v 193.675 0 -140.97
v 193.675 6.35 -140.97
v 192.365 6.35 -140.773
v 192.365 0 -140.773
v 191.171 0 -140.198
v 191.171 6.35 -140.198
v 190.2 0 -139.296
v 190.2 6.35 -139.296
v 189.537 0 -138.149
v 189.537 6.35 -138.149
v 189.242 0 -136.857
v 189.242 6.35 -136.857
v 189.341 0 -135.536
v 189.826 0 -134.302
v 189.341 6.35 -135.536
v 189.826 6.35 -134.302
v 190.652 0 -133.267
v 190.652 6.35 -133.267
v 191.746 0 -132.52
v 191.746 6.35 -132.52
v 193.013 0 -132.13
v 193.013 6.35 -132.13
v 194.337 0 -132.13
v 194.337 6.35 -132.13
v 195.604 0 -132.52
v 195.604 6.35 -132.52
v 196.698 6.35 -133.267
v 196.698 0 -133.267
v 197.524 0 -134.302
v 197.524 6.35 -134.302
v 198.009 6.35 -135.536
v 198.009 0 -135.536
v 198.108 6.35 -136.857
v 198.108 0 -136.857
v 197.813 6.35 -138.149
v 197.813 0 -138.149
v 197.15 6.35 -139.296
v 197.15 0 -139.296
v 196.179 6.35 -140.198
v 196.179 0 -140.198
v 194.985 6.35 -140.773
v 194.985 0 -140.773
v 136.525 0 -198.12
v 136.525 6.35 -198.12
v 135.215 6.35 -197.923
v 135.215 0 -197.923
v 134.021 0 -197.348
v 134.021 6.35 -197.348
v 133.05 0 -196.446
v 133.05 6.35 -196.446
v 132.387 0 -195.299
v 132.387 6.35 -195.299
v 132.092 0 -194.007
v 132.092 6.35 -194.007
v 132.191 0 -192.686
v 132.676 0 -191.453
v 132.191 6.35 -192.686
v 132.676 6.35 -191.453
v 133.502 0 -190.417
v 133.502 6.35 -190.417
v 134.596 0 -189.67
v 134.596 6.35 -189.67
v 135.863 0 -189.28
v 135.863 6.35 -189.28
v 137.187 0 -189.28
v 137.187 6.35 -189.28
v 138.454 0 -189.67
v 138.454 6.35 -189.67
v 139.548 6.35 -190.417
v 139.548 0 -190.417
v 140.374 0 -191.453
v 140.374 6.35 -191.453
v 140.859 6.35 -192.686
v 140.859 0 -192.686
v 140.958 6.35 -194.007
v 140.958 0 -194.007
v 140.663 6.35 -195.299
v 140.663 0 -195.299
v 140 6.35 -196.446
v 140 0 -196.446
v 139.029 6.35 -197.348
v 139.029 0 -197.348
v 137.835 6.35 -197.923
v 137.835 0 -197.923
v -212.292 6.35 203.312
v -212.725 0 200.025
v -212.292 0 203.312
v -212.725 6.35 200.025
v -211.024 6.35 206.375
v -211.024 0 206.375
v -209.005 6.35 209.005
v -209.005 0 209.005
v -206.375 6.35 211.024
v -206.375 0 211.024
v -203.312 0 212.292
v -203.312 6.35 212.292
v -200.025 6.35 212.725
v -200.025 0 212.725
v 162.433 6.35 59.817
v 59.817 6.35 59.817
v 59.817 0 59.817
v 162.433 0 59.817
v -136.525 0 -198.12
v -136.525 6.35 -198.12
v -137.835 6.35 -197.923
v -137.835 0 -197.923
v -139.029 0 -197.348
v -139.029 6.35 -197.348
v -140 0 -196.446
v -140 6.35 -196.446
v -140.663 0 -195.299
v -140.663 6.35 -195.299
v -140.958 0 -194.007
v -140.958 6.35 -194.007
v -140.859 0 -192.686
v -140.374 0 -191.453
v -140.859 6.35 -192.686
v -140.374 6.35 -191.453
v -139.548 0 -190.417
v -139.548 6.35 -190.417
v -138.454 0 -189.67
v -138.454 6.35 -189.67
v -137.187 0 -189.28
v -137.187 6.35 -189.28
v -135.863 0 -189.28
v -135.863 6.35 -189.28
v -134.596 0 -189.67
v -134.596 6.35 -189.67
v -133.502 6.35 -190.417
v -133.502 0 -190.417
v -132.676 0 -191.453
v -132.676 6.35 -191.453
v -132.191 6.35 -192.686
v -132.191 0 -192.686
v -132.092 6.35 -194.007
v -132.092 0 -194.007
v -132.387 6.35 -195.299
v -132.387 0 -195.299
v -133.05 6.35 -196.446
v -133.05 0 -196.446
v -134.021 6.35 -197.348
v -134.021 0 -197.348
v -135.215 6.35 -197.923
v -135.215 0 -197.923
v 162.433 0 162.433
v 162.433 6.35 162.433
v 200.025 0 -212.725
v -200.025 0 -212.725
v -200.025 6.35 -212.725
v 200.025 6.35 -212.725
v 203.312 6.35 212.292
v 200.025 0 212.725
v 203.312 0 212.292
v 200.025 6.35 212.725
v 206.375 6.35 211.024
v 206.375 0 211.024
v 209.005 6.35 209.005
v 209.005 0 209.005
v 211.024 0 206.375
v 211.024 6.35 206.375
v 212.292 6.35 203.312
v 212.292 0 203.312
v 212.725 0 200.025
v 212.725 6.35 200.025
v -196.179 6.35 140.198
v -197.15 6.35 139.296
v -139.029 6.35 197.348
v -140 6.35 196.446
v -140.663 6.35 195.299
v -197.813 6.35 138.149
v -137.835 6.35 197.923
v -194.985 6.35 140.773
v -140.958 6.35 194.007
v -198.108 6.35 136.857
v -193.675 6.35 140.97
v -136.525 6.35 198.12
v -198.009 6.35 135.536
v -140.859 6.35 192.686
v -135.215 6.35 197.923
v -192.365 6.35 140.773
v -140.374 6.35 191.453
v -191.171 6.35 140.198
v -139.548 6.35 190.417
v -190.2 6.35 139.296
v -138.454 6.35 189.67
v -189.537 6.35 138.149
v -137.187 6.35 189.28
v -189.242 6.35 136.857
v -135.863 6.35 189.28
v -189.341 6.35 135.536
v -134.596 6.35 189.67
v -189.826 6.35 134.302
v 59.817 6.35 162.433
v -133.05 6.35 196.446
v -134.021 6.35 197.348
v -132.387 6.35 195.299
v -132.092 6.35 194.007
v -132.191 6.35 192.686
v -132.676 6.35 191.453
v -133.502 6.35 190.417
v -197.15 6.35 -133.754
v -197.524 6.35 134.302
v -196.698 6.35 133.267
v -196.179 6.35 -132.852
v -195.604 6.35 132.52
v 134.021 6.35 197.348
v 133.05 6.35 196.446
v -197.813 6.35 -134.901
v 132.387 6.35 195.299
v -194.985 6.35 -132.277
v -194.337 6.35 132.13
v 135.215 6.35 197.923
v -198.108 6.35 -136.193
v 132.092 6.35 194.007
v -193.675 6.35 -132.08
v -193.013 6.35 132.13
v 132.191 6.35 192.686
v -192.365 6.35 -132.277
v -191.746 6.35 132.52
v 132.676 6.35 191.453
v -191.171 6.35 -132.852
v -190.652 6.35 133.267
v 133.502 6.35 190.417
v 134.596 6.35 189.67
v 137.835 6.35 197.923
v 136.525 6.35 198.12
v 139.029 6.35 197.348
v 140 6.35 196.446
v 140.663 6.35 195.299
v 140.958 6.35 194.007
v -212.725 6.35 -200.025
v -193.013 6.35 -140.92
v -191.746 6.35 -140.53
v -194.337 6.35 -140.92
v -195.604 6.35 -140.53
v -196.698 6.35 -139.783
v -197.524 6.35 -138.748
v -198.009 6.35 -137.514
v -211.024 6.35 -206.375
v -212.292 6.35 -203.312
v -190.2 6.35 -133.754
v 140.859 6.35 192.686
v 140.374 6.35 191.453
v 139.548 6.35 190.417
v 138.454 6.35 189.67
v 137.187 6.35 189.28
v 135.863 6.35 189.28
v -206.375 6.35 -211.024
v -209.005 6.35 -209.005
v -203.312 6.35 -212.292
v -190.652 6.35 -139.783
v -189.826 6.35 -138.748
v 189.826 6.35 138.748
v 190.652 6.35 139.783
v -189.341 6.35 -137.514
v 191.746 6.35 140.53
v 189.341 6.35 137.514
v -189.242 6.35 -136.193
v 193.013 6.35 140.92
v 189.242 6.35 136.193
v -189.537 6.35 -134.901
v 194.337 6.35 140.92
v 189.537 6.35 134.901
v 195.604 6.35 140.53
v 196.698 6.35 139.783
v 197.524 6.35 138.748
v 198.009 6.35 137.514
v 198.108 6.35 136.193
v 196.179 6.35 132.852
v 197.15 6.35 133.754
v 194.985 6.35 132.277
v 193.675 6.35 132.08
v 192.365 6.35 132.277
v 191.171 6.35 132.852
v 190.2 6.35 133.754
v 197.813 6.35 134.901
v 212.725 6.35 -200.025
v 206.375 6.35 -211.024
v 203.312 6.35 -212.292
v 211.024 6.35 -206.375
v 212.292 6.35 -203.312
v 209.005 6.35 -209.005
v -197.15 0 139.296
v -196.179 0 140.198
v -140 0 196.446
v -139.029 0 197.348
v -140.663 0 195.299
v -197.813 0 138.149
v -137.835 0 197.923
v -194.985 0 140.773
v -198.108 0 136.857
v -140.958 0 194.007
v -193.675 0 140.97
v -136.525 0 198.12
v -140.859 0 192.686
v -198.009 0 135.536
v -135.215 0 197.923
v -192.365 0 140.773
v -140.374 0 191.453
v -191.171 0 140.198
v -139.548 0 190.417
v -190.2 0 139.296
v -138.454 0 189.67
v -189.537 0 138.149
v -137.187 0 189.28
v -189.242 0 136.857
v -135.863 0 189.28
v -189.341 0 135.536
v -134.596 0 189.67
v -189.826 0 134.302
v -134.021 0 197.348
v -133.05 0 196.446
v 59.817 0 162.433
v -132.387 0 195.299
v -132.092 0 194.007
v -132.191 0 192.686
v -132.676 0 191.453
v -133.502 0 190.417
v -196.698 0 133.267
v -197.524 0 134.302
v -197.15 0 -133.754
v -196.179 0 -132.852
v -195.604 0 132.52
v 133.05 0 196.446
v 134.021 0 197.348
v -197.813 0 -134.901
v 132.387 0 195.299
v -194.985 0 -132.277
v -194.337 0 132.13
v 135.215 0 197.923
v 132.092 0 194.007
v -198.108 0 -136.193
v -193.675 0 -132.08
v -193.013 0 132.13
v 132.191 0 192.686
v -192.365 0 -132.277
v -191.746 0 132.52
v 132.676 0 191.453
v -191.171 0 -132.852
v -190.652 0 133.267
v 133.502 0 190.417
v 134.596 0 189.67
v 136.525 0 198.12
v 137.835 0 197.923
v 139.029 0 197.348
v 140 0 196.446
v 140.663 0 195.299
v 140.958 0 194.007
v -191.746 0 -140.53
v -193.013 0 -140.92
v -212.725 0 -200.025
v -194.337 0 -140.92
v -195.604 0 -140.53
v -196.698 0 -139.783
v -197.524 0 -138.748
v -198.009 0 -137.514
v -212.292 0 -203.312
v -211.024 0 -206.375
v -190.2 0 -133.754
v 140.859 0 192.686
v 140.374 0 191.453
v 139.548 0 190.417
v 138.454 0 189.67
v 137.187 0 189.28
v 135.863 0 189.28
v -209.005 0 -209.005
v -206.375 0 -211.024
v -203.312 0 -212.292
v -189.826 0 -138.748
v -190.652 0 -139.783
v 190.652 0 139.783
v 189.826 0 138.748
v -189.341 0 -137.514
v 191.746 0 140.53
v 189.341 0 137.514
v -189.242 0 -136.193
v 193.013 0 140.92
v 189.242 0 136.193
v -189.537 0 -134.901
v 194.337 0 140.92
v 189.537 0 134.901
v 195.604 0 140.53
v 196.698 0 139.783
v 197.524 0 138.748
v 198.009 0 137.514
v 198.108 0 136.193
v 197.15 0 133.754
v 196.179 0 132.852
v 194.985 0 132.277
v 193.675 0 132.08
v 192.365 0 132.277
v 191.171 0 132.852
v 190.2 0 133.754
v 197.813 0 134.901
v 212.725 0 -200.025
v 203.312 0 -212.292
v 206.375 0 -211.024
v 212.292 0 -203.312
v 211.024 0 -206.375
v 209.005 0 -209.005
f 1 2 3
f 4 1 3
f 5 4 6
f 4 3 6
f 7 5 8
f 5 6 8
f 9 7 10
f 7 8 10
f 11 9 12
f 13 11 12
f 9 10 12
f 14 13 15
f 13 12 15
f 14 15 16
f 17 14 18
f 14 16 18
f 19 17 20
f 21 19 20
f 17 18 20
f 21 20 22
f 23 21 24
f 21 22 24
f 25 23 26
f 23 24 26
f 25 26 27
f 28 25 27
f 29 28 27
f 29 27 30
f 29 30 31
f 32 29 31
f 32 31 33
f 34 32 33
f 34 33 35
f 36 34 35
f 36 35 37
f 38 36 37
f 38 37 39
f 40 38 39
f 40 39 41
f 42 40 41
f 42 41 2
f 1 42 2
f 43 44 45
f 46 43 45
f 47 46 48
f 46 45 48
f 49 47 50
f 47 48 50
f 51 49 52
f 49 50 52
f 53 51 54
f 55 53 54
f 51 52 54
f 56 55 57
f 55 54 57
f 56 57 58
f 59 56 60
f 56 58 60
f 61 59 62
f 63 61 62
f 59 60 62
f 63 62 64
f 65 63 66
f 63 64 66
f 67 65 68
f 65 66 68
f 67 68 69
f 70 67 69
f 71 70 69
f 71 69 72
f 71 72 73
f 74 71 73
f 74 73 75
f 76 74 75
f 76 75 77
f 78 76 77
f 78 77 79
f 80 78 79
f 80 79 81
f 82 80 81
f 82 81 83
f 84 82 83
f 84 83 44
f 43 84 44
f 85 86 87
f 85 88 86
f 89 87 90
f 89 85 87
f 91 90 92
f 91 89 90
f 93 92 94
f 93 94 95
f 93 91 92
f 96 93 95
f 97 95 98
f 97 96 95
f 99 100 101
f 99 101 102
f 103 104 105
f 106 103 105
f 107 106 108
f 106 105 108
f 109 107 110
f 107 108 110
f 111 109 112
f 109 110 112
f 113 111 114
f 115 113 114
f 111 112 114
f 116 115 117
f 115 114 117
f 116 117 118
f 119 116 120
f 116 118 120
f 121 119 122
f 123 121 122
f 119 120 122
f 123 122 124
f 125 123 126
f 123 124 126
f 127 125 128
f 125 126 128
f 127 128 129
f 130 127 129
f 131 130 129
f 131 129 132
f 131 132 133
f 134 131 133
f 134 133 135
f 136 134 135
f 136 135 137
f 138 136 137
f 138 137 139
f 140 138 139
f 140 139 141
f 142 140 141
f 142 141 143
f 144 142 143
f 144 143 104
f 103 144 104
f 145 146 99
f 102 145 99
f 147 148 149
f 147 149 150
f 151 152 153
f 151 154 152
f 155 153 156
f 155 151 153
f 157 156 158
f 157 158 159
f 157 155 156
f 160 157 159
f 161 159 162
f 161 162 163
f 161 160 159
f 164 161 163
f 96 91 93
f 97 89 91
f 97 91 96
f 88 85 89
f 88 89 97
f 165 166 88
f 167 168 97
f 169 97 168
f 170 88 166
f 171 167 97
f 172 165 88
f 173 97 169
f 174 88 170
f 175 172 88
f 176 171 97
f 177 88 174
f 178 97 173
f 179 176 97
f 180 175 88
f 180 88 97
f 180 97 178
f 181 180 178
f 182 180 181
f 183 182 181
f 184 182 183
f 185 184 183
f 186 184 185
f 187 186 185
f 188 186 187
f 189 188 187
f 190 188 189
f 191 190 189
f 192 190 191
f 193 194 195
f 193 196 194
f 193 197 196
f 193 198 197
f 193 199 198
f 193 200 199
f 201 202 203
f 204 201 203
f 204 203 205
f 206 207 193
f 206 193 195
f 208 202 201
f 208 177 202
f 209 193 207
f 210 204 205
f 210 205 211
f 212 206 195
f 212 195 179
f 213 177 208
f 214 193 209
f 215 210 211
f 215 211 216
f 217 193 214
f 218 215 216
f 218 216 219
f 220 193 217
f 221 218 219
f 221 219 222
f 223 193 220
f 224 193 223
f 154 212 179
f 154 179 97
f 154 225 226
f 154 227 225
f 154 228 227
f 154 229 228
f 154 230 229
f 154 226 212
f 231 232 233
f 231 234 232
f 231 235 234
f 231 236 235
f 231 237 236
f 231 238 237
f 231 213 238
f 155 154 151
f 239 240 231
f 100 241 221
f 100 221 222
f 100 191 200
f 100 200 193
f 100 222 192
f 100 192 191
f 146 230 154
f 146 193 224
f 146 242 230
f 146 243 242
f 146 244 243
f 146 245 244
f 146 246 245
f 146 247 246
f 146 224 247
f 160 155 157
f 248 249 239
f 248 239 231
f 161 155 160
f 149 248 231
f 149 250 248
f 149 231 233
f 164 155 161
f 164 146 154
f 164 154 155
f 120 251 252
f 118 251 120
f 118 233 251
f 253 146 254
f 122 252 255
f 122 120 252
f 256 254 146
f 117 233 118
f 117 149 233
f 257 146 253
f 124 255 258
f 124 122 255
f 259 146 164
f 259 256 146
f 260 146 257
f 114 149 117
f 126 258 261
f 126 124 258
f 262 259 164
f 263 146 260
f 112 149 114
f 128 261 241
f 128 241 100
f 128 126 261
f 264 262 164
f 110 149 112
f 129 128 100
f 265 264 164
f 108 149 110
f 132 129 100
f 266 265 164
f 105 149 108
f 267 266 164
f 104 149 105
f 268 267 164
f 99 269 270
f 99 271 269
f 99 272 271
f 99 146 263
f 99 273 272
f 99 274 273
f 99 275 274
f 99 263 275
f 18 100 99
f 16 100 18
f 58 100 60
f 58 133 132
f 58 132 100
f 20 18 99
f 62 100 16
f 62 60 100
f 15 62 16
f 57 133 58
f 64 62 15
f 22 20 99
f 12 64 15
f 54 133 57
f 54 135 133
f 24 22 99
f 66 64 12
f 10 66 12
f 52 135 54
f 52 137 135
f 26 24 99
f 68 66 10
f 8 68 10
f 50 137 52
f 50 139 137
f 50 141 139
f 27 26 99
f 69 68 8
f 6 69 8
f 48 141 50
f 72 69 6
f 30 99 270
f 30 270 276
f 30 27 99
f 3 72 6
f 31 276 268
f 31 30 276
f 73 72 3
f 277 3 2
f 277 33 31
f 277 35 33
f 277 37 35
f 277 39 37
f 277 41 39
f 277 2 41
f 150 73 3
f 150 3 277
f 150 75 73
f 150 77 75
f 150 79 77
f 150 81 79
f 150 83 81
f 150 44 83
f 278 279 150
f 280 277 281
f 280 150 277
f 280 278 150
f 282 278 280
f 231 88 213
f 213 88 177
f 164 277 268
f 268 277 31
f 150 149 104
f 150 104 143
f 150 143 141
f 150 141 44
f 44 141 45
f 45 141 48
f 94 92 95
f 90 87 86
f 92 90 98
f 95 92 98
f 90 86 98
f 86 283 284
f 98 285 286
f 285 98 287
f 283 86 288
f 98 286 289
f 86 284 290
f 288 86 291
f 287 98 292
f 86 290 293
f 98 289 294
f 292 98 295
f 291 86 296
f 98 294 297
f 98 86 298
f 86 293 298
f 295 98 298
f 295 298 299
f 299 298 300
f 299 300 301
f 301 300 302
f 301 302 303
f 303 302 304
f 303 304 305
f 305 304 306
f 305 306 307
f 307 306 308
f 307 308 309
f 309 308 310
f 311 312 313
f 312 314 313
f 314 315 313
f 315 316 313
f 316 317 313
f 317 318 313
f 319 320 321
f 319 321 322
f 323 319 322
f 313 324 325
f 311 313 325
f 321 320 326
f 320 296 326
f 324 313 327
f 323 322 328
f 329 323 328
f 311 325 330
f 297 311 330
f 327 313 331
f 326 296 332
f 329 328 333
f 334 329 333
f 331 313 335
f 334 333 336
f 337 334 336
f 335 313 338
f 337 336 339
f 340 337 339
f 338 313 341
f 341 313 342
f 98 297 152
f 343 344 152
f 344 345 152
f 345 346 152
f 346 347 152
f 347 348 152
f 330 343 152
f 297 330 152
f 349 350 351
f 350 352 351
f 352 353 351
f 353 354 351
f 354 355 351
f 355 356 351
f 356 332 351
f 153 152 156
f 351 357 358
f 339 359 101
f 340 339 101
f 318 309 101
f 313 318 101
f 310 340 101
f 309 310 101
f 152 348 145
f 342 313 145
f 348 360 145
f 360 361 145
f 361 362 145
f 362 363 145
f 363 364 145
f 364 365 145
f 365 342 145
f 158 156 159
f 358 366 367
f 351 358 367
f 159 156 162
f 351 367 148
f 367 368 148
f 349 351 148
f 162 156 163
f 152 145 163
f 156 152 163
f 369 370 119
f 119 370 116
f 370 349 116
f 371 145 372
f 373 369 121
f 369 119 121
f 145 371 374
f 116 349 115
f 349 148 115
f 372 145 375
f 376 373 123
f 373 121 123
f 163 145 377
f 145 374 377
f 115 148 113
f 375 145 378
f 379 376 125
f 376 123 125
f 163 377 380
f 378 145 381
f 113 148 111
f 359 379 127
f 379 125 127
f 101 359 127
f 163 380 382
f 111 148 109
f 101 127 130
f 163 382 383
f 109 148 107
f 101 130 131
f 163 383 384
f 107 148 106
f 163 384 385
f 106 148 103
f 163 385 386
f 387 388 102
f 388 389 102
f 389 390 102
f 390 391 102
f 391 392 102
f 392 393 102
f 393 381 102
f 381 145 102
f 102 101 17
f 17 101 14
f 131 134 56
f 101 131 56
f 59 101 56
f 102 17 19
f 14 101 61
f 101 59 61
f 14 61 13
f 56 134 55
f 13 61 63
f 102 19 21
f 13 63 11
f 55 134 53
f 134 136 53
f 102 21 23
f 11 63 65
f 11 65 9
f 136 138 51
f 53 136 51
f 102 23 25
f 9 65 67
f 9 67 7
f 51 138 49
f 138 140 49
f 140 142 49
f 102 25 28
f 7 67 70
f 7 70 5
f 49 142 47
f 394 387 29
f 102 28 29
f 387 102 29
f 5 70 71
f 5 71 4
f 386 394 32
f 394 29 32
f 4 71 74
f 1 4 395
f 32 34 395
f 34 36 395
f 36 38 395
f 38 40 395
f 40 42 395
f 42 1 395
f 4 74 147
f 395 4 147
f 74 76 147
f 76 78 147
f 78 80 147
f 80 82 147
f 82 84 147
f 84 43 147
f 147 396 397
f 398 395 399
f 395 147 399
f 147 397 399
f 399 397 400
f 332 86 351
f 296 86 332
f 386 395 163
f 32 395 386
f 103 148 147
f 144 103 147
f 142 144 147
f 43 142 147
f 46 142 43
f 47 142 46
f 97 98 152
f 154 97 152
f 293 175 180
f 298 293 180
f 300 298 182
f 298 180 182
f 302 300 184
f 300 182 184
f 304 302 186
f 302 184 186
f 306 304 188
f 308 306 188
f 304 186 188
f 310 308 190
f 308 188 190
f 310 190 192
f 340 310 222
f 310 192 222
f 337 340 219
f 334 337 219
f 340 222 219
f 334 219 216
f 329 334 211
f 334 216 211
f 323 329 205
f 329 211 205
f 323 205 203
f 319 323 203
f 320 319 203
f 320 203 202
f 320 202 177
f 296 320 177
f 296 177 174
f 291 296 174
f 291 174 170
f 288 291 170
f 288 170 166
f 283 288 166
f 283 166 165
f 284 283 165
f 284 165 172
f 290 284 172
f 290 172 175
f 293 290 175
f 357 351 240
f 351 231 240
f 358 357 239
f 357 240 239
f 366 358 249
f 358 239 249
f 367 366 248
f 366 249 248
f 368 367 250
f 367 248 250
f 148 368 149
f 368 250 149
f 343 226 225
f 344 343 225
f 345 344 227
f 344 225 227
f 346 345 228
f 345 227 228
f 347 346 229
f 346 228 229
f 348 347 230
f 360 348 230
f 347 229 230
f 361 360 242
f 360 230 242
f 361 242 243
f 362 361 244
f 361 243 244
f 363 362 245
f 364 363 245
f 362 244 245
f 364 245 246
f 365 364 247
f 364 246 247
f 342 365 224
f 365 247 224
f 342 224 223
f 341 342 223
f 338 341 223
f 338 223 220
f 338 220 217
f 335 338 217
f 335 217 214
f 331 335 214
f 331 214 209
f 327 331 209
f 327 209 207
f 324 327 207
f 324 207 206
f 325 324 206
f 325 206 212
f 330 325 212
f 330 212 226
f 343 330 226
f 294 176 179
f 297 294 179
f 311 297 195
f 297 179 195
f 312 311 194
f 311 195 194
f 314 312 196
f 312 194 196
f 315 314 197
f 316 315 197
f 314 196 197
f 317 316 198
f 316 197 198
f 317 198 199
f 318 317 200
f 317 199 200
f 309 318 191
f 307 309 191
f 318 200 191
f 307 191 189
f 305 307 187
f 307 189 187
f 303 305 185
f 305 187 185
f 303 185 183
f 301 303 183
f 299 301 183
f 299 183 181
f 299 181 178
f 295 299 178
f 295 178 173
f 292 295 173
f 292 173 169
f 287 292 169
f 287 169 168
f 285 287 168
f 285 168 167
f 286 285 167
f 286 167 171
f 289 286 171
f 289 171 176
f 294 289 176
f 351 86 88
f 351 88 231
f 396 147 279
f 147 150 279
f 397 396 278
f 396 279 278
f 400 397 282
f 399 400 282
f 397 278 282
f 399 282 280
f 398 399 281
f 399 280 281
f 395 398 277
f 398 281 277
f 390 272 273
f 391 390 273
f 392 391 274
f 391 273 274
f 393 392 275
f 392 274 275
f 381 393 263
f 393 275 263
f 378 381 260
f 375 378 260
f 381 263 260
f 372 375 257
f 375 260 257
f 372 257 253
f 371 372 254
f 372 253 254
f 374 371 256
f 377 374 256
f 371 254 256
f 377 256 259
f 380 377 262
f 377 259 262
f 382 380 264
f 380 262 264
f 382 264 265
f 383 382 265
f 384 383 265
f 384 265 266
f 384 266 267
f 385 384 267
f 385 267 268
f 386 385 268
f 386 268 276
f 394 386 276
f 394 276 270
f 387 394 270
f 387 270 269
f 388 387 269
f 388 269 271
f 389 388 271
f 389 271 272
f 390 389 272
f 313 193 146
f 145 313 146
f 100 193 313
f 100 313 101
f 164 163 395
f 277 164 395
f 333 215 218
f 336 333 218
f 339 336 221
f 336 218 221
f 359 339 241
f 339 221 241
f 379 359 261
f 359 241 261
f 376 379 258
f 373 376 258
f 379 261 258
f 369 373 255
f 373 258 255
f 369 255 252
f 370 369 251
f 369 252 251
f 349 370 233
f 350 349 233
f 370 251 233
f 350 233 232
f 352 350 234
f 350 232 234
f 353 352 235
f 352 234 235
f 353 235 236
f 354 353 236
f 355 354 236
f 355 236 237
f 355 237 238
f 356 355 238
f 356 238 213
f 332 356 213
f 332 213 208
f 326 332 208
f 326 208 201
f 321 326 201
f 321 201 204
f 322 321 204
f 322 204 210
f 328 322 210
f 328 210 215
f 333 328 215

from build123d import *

# Parameters (mm, degrees)
SKETCH1_W           = 425.45
SKETCH1_H           = 425.45
BOSS_EXTRUDE1_DEPTH = 6.35
SKETCH4_R           = 4.445
CUT_EXTRUDE2_DEPTH  = 301.90558943
SKETCH5_W           = 102.616
SKETCH5_H           = 102.616
CUT_EXTRUDE3_DEPTH  = 301.90558943
FILLET1_R           = 12.7


with BuildPart() as part:
    # Sketch1 → Boss-Extrude1 (new body)
    with BuildSketch(Plane(origin=(0, 0, 0), x_dir=(1, 0, 0), z_dir=(0, 1, 0))):
        Rectangle(SKETCH1_W, SKETCH1_H)
    extrude(amount=BOSS_EXTRUDE1_DEPTH)

    # Sketch4 → Cut-Extrude2 (cut, through all)
    with BuildSketch(Plane(origin=(0, 6.35, 0), x_dir=(1, 0, 0), z_dir=(0, 1, 0))):
        with Locations(Location((-193.675, 136.525, 0), (0, 0, 270))):
            Circle(SKETCH4_R)
        with Locations(Location((-193.675, -136.525, 0), (0, 0, 270))):
            Circle(SKETCH4_R)
        with Locations(Location((-136.525, -193.675, 0), (0, 0, 270))):
            Circle(SKETCH4_R)
        with Locations(Location((136.525, -193.675, 0), (0, 0, 270))):
            Circle(SKETCH4_R)
        with Locations(Location((193.675, -136.525, 0), (0, 0, 90))):
            Circle(SKETCH4_R)
        with Locations(Location((193.675, 136.525, 0), (0, 0, 90))):
            Circle(SKETCH4_R)
        with Locations(Location((136.525, 193.675, 0), (0, 0, 90))):
            Circle(SKETCH4_R)
        with Locations(Location((-136.525, 193.675, 0), (0, 0, 90))):
            Circle(SKETCH4_R)
    extrude(amount=-CUT_EXTRUDE2_DEPTH, mode=Mode.SUBTRACT)

    # Sketch5 → Cut-Extrude3 (cut, through all)
    with BuildSketch(Plane(origin=(0, 6.35, 0), x_dir=(1, 0, 0), z_dir=(0, 1, 0))):
        with Locations((111.125, -111.125)):
            Rectangle(SKETCH5_W, SKETCH5_H)
    extrude(amount=-CUT_EXTRUDE3_DEPTH, mode=Mode.SUBTRACT)

    # Fillet1
    fillet1_edges = [part.edges().sort_by_distance(p)[0] for p in [
        (212.725, 3.175, 212.725),
        (-212.725, 3.175, 212.725),
        (-212.725, 3.175, -212.725),
        (212.725, 3.175, -212.725),
    ]]
    fillet(fillet1_edges, radius=FILLET1_R)


solid = part.part
